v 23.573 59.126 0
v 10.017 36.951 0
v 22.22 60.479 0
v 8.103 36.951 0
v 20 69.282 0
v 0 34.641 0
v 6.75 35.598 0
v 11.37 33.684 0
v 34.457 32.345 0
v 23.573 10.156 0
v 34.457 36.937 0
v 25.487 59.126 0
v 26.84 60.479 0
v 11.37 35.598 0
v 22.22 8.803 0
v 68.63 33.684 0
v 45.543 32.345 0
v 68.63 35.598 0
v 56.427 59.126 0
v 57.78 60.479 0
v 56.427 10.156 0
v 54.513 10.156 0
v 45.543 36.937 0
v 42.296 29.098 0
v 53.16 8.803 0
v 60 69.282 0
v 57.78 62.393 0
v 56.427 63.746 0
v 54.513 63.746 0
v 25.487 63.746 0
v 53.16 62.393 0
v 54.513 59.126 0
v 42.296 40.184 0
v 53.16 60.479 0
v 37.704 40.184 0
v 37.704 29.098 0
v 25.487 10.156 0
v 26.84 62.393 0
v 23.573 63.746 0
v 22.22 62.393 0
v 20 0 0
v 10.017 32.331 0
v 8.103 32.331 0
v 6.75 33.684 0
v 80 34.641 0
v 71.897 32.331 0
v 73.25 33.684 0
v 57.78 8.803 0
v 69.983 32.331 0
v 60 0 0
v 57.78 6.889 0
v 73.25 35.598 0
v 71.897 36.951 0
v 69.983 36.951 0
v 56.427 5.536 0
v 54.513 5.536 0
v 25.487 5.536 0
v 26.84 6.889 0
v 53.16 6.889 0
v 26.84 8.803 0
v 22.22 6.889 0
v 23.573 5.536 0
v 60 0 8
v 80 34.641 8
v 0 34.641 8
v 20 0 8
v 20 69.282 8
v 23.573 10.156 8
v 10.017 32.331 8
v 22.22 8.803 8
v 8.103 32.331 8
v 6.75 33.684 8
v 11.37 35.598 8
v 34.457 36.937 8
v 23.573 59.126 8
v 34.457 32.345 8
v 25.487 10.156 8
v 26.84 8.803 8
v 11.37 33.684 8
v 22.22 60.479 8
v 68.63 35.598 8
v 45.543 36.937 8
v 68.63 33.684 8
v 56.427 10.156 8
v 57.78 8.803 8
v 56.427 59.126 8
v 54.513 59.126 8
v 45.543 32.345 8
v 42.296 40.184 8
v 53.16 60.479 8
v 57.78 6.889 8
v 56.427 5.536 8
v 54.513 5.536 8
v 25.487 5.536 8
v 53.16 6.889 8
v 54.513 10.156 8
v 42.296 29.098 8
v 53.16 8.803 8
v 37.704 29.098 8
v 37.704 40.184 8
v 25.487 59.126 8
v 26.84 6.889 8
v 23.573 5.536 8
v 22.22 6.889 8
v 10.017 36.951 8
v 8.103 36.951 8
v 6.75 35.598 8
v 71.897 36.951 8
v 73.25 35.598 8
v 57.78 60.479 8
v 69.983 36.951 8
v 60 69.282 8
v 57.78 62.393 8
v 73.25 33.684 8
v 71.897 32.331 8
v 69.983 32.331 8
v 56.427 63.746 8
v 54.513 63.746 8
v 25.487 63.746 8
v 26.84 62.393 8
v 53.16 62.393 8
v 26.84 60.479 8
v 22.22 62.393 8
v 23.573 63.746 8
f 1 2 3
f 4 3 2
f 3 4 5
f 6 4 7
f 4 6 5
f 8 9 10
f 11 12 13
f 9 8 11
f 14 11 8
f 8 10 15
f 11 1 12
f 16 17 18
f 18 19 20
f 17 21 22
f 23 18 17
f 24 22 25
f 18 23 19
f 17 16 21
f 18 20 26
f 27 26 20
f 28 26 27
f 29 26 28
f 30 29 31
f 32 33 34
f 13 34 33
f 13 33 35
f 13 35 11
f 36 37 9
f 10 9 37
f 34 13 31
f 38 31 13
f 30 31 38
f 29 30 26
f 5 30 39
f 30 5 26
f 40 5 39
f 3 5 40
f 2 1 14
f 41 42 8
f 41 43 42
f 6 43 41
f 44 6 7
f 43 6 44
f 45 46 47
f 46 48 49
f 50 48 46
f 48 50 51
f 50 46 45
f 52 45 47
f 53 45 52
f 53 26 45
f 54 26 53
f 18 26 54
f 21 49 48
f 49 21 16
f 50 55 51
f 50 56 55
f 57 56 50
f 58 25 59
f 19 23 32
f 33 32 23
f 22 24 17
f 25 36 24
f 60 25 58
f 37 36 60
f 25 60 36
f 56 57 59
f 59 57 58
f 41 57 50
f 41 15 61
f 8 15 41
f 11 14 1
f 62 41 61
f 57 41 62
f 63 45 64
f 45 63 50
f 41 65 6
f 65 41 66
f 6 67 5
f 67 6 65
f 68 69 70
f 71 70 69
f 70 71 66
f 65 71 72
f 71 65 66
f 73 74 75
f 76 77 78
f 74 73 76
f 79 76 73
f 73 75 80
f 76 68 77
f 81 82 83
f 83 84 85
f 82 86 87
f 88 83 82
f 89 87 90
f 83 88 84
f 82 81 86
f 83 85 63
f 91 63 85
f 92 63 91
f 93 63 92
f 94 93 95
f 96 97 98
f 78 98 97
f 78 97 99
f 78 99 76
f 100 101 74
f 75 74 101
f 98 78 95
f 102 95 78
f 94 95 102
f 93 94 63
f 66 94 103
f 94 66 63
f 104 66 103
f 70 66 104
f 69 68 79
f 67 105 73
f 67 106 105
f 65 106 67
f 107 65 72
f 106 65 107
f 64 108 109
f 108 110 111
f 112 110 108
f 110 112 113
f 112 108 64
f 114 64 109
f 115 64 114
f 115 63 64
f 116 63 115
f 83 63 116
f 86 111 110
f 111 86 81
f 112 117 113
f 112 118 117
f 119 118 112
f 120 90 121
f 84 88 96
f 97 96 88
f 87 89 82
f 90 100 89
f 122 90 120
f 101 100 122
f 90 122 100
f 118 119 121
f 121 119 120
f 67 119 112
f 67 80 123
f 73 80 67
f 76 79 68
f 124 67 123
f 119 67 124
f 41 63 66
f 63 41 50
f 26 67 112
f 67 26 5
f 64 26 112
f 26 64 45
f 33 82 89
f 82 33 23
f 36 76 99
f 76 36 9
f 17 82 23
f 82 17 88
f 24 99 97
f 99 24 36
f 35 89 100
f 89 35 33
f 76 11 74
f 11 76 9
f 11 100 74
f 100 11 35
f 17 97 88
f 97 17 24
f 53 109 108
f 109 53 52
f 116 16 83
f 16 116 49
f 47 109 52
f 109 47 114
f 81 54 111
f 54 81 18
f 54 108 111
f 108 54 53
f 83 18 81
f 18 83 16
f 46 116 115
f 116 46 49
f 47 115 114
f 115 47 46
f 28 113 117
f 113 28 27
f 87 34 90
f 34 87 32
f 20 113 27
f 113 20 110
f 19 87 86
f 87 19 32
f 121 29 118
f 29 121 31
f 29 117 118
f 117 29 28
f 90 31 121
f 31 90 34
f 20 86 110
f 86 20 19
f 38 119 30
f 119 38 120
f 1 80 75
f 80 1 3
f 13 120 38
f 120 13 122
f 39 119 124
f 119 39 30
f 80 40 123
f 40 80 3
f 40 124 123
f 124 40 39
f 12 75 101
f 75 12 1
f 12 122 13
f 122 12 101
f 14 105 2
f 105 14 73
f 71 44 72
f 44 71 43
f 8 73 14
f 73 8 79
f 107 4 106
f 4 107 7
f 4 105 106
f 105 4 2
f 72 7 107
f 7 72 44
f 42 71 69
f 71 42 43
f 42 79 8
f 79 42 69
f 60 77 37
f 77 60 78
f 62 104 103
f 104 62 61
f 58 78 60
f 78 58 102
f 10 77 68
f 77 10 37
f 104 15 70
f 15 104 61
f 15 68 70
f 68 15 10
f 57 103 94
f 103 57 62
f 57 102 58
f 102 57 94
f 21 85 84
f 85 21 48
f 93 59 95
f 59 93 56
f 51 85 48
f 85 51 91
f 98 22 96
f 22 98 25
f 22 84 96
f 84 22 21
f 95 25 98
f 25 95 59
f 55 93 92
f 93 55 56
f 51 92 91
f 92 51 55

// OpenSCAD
$fn = 32;

// ----------------------------------------------------------------------
// Polygon plate: 6-gon R40, 6 bolt windows
// ----------------------------------------------------------------------

// --- parameters (mm) ---
sides = 6;                // number of polygon sides
plate_r = 40;             // circumscribed radius of the polygon
bore_r = 6;               // centre bore radius
bolts = 6;                // number of bolt windows
ring_r = 30.94;           // bolt-circle radius
bolt_r = 2.5;             // bolt window radius
plate_t = 8;              // plate thickness, Z (extrusion height)
fit_tol = 0.1;            // declared fit tolerance (prompt contract)
free_tol = 0.5;           // declared free tolerance (prompt contract)

plate_d = 2 * plate_r;  // circumscribed diameter
bore_d = 2 * bore_r;  // centre bore diameter
bolt_d = 2 * bolt_r;  // bolt window diameter
ring_d = 2 * ring_r;  // bolt-circle diameter

profile = [[80, 34.641], [60, 69.282], [20, 69.282], [0, 34.641], [20, 0], [60, 0]];  // primary outline, 6 points, counter clockwise
void_1 = [[45.543, 36.937], [42.296, 40.184], [37.704, 40.184], [34.457, 36.937], [34.457, 32.345], [37.704, 29.098], [42.296, 29.098], [45.543, 32.345]];  // centre bore, 8 points
void_2 = [[73.25, 35.598], [71.897, 36.951], [69.983, 36.951], [68.63, 35.598], [68.63, 33.684], [69.983, 32.331], [71.897, 32.331], [73.25, 33.684]];  // bolt window 1, 8 points
void_3 = [[57.78, 62.393], [56.427, 63.746], [54.513, 63.746], [53.16, 62.393], [53.16, 60.479], [54.513, 59.126], [56.427, 59.126], [57.78, 60.479]];  // bolt window 2, 8 points
void_4 = [[26.84, 62.393], [25.487, 63.746], [23.573, 63.746], [22.22, 62.393], [22.22, 60.479], [23.573, 59.126], [25.487, 59.126], [26.84, 60.479]];  // bolt window 3, 8 points
void_5 = [[11.37, 35.598], [10.017, 36.951], [8.103, 36.951], [6.75, 35.598], [6.75, 33.684], [8.103, 32.331], [10.017, 32.331], [11.37, 33.684]];  // bolt window 4, 8 points
void_6 = [[26.84, 8.803], [25.487, 10.156], [23.573, 10.156], [22.22, 8.803], [22.22, 6.889], [23.573, 5.536], [25.487, 5.536], [26.84, 6.889]];  // bolt window 5, 8 points
void_7 = [[57.78, 8.803], [56.427, 10.156], [54.513, 10.156], [53.16, 8.803], [53.16, 6.889], [54.513, 5.536], [56.427, 5.536], [57.78, 6.889]];  // bolt window 6, 8 points

// --- the one profile operation ---
difference() {
  linear_extrude(height = plate_t) polygon(points = profile);
  translate([0, 0, -1])
    linear_extrude(height = plate_t + 2) polygon(points = void_1);
  translate([0, 0, -1])
    linear_extrude(height = plate_t + 2) polygon(points = void_2);
  translate([0, 0, -1])
    linear_extrude(height = plate_t + 2) polygon(points = void_3);
  translate([0, 0, -1])
    linear_extrude(height = plate_t + 2) polygon(points = void_4);
  translate([0, 0, -1])
    linear_extrude(height = plate_t + 2) polygon(points = void_5);
  translate([0, 0, -1])
    linear_extrude(height = plate_t + 2) polygon(points = void_6);
  translate([0, 0, -1])
    linear_extrude(height = plate_t + 2) polygon(points = void_7);
}
